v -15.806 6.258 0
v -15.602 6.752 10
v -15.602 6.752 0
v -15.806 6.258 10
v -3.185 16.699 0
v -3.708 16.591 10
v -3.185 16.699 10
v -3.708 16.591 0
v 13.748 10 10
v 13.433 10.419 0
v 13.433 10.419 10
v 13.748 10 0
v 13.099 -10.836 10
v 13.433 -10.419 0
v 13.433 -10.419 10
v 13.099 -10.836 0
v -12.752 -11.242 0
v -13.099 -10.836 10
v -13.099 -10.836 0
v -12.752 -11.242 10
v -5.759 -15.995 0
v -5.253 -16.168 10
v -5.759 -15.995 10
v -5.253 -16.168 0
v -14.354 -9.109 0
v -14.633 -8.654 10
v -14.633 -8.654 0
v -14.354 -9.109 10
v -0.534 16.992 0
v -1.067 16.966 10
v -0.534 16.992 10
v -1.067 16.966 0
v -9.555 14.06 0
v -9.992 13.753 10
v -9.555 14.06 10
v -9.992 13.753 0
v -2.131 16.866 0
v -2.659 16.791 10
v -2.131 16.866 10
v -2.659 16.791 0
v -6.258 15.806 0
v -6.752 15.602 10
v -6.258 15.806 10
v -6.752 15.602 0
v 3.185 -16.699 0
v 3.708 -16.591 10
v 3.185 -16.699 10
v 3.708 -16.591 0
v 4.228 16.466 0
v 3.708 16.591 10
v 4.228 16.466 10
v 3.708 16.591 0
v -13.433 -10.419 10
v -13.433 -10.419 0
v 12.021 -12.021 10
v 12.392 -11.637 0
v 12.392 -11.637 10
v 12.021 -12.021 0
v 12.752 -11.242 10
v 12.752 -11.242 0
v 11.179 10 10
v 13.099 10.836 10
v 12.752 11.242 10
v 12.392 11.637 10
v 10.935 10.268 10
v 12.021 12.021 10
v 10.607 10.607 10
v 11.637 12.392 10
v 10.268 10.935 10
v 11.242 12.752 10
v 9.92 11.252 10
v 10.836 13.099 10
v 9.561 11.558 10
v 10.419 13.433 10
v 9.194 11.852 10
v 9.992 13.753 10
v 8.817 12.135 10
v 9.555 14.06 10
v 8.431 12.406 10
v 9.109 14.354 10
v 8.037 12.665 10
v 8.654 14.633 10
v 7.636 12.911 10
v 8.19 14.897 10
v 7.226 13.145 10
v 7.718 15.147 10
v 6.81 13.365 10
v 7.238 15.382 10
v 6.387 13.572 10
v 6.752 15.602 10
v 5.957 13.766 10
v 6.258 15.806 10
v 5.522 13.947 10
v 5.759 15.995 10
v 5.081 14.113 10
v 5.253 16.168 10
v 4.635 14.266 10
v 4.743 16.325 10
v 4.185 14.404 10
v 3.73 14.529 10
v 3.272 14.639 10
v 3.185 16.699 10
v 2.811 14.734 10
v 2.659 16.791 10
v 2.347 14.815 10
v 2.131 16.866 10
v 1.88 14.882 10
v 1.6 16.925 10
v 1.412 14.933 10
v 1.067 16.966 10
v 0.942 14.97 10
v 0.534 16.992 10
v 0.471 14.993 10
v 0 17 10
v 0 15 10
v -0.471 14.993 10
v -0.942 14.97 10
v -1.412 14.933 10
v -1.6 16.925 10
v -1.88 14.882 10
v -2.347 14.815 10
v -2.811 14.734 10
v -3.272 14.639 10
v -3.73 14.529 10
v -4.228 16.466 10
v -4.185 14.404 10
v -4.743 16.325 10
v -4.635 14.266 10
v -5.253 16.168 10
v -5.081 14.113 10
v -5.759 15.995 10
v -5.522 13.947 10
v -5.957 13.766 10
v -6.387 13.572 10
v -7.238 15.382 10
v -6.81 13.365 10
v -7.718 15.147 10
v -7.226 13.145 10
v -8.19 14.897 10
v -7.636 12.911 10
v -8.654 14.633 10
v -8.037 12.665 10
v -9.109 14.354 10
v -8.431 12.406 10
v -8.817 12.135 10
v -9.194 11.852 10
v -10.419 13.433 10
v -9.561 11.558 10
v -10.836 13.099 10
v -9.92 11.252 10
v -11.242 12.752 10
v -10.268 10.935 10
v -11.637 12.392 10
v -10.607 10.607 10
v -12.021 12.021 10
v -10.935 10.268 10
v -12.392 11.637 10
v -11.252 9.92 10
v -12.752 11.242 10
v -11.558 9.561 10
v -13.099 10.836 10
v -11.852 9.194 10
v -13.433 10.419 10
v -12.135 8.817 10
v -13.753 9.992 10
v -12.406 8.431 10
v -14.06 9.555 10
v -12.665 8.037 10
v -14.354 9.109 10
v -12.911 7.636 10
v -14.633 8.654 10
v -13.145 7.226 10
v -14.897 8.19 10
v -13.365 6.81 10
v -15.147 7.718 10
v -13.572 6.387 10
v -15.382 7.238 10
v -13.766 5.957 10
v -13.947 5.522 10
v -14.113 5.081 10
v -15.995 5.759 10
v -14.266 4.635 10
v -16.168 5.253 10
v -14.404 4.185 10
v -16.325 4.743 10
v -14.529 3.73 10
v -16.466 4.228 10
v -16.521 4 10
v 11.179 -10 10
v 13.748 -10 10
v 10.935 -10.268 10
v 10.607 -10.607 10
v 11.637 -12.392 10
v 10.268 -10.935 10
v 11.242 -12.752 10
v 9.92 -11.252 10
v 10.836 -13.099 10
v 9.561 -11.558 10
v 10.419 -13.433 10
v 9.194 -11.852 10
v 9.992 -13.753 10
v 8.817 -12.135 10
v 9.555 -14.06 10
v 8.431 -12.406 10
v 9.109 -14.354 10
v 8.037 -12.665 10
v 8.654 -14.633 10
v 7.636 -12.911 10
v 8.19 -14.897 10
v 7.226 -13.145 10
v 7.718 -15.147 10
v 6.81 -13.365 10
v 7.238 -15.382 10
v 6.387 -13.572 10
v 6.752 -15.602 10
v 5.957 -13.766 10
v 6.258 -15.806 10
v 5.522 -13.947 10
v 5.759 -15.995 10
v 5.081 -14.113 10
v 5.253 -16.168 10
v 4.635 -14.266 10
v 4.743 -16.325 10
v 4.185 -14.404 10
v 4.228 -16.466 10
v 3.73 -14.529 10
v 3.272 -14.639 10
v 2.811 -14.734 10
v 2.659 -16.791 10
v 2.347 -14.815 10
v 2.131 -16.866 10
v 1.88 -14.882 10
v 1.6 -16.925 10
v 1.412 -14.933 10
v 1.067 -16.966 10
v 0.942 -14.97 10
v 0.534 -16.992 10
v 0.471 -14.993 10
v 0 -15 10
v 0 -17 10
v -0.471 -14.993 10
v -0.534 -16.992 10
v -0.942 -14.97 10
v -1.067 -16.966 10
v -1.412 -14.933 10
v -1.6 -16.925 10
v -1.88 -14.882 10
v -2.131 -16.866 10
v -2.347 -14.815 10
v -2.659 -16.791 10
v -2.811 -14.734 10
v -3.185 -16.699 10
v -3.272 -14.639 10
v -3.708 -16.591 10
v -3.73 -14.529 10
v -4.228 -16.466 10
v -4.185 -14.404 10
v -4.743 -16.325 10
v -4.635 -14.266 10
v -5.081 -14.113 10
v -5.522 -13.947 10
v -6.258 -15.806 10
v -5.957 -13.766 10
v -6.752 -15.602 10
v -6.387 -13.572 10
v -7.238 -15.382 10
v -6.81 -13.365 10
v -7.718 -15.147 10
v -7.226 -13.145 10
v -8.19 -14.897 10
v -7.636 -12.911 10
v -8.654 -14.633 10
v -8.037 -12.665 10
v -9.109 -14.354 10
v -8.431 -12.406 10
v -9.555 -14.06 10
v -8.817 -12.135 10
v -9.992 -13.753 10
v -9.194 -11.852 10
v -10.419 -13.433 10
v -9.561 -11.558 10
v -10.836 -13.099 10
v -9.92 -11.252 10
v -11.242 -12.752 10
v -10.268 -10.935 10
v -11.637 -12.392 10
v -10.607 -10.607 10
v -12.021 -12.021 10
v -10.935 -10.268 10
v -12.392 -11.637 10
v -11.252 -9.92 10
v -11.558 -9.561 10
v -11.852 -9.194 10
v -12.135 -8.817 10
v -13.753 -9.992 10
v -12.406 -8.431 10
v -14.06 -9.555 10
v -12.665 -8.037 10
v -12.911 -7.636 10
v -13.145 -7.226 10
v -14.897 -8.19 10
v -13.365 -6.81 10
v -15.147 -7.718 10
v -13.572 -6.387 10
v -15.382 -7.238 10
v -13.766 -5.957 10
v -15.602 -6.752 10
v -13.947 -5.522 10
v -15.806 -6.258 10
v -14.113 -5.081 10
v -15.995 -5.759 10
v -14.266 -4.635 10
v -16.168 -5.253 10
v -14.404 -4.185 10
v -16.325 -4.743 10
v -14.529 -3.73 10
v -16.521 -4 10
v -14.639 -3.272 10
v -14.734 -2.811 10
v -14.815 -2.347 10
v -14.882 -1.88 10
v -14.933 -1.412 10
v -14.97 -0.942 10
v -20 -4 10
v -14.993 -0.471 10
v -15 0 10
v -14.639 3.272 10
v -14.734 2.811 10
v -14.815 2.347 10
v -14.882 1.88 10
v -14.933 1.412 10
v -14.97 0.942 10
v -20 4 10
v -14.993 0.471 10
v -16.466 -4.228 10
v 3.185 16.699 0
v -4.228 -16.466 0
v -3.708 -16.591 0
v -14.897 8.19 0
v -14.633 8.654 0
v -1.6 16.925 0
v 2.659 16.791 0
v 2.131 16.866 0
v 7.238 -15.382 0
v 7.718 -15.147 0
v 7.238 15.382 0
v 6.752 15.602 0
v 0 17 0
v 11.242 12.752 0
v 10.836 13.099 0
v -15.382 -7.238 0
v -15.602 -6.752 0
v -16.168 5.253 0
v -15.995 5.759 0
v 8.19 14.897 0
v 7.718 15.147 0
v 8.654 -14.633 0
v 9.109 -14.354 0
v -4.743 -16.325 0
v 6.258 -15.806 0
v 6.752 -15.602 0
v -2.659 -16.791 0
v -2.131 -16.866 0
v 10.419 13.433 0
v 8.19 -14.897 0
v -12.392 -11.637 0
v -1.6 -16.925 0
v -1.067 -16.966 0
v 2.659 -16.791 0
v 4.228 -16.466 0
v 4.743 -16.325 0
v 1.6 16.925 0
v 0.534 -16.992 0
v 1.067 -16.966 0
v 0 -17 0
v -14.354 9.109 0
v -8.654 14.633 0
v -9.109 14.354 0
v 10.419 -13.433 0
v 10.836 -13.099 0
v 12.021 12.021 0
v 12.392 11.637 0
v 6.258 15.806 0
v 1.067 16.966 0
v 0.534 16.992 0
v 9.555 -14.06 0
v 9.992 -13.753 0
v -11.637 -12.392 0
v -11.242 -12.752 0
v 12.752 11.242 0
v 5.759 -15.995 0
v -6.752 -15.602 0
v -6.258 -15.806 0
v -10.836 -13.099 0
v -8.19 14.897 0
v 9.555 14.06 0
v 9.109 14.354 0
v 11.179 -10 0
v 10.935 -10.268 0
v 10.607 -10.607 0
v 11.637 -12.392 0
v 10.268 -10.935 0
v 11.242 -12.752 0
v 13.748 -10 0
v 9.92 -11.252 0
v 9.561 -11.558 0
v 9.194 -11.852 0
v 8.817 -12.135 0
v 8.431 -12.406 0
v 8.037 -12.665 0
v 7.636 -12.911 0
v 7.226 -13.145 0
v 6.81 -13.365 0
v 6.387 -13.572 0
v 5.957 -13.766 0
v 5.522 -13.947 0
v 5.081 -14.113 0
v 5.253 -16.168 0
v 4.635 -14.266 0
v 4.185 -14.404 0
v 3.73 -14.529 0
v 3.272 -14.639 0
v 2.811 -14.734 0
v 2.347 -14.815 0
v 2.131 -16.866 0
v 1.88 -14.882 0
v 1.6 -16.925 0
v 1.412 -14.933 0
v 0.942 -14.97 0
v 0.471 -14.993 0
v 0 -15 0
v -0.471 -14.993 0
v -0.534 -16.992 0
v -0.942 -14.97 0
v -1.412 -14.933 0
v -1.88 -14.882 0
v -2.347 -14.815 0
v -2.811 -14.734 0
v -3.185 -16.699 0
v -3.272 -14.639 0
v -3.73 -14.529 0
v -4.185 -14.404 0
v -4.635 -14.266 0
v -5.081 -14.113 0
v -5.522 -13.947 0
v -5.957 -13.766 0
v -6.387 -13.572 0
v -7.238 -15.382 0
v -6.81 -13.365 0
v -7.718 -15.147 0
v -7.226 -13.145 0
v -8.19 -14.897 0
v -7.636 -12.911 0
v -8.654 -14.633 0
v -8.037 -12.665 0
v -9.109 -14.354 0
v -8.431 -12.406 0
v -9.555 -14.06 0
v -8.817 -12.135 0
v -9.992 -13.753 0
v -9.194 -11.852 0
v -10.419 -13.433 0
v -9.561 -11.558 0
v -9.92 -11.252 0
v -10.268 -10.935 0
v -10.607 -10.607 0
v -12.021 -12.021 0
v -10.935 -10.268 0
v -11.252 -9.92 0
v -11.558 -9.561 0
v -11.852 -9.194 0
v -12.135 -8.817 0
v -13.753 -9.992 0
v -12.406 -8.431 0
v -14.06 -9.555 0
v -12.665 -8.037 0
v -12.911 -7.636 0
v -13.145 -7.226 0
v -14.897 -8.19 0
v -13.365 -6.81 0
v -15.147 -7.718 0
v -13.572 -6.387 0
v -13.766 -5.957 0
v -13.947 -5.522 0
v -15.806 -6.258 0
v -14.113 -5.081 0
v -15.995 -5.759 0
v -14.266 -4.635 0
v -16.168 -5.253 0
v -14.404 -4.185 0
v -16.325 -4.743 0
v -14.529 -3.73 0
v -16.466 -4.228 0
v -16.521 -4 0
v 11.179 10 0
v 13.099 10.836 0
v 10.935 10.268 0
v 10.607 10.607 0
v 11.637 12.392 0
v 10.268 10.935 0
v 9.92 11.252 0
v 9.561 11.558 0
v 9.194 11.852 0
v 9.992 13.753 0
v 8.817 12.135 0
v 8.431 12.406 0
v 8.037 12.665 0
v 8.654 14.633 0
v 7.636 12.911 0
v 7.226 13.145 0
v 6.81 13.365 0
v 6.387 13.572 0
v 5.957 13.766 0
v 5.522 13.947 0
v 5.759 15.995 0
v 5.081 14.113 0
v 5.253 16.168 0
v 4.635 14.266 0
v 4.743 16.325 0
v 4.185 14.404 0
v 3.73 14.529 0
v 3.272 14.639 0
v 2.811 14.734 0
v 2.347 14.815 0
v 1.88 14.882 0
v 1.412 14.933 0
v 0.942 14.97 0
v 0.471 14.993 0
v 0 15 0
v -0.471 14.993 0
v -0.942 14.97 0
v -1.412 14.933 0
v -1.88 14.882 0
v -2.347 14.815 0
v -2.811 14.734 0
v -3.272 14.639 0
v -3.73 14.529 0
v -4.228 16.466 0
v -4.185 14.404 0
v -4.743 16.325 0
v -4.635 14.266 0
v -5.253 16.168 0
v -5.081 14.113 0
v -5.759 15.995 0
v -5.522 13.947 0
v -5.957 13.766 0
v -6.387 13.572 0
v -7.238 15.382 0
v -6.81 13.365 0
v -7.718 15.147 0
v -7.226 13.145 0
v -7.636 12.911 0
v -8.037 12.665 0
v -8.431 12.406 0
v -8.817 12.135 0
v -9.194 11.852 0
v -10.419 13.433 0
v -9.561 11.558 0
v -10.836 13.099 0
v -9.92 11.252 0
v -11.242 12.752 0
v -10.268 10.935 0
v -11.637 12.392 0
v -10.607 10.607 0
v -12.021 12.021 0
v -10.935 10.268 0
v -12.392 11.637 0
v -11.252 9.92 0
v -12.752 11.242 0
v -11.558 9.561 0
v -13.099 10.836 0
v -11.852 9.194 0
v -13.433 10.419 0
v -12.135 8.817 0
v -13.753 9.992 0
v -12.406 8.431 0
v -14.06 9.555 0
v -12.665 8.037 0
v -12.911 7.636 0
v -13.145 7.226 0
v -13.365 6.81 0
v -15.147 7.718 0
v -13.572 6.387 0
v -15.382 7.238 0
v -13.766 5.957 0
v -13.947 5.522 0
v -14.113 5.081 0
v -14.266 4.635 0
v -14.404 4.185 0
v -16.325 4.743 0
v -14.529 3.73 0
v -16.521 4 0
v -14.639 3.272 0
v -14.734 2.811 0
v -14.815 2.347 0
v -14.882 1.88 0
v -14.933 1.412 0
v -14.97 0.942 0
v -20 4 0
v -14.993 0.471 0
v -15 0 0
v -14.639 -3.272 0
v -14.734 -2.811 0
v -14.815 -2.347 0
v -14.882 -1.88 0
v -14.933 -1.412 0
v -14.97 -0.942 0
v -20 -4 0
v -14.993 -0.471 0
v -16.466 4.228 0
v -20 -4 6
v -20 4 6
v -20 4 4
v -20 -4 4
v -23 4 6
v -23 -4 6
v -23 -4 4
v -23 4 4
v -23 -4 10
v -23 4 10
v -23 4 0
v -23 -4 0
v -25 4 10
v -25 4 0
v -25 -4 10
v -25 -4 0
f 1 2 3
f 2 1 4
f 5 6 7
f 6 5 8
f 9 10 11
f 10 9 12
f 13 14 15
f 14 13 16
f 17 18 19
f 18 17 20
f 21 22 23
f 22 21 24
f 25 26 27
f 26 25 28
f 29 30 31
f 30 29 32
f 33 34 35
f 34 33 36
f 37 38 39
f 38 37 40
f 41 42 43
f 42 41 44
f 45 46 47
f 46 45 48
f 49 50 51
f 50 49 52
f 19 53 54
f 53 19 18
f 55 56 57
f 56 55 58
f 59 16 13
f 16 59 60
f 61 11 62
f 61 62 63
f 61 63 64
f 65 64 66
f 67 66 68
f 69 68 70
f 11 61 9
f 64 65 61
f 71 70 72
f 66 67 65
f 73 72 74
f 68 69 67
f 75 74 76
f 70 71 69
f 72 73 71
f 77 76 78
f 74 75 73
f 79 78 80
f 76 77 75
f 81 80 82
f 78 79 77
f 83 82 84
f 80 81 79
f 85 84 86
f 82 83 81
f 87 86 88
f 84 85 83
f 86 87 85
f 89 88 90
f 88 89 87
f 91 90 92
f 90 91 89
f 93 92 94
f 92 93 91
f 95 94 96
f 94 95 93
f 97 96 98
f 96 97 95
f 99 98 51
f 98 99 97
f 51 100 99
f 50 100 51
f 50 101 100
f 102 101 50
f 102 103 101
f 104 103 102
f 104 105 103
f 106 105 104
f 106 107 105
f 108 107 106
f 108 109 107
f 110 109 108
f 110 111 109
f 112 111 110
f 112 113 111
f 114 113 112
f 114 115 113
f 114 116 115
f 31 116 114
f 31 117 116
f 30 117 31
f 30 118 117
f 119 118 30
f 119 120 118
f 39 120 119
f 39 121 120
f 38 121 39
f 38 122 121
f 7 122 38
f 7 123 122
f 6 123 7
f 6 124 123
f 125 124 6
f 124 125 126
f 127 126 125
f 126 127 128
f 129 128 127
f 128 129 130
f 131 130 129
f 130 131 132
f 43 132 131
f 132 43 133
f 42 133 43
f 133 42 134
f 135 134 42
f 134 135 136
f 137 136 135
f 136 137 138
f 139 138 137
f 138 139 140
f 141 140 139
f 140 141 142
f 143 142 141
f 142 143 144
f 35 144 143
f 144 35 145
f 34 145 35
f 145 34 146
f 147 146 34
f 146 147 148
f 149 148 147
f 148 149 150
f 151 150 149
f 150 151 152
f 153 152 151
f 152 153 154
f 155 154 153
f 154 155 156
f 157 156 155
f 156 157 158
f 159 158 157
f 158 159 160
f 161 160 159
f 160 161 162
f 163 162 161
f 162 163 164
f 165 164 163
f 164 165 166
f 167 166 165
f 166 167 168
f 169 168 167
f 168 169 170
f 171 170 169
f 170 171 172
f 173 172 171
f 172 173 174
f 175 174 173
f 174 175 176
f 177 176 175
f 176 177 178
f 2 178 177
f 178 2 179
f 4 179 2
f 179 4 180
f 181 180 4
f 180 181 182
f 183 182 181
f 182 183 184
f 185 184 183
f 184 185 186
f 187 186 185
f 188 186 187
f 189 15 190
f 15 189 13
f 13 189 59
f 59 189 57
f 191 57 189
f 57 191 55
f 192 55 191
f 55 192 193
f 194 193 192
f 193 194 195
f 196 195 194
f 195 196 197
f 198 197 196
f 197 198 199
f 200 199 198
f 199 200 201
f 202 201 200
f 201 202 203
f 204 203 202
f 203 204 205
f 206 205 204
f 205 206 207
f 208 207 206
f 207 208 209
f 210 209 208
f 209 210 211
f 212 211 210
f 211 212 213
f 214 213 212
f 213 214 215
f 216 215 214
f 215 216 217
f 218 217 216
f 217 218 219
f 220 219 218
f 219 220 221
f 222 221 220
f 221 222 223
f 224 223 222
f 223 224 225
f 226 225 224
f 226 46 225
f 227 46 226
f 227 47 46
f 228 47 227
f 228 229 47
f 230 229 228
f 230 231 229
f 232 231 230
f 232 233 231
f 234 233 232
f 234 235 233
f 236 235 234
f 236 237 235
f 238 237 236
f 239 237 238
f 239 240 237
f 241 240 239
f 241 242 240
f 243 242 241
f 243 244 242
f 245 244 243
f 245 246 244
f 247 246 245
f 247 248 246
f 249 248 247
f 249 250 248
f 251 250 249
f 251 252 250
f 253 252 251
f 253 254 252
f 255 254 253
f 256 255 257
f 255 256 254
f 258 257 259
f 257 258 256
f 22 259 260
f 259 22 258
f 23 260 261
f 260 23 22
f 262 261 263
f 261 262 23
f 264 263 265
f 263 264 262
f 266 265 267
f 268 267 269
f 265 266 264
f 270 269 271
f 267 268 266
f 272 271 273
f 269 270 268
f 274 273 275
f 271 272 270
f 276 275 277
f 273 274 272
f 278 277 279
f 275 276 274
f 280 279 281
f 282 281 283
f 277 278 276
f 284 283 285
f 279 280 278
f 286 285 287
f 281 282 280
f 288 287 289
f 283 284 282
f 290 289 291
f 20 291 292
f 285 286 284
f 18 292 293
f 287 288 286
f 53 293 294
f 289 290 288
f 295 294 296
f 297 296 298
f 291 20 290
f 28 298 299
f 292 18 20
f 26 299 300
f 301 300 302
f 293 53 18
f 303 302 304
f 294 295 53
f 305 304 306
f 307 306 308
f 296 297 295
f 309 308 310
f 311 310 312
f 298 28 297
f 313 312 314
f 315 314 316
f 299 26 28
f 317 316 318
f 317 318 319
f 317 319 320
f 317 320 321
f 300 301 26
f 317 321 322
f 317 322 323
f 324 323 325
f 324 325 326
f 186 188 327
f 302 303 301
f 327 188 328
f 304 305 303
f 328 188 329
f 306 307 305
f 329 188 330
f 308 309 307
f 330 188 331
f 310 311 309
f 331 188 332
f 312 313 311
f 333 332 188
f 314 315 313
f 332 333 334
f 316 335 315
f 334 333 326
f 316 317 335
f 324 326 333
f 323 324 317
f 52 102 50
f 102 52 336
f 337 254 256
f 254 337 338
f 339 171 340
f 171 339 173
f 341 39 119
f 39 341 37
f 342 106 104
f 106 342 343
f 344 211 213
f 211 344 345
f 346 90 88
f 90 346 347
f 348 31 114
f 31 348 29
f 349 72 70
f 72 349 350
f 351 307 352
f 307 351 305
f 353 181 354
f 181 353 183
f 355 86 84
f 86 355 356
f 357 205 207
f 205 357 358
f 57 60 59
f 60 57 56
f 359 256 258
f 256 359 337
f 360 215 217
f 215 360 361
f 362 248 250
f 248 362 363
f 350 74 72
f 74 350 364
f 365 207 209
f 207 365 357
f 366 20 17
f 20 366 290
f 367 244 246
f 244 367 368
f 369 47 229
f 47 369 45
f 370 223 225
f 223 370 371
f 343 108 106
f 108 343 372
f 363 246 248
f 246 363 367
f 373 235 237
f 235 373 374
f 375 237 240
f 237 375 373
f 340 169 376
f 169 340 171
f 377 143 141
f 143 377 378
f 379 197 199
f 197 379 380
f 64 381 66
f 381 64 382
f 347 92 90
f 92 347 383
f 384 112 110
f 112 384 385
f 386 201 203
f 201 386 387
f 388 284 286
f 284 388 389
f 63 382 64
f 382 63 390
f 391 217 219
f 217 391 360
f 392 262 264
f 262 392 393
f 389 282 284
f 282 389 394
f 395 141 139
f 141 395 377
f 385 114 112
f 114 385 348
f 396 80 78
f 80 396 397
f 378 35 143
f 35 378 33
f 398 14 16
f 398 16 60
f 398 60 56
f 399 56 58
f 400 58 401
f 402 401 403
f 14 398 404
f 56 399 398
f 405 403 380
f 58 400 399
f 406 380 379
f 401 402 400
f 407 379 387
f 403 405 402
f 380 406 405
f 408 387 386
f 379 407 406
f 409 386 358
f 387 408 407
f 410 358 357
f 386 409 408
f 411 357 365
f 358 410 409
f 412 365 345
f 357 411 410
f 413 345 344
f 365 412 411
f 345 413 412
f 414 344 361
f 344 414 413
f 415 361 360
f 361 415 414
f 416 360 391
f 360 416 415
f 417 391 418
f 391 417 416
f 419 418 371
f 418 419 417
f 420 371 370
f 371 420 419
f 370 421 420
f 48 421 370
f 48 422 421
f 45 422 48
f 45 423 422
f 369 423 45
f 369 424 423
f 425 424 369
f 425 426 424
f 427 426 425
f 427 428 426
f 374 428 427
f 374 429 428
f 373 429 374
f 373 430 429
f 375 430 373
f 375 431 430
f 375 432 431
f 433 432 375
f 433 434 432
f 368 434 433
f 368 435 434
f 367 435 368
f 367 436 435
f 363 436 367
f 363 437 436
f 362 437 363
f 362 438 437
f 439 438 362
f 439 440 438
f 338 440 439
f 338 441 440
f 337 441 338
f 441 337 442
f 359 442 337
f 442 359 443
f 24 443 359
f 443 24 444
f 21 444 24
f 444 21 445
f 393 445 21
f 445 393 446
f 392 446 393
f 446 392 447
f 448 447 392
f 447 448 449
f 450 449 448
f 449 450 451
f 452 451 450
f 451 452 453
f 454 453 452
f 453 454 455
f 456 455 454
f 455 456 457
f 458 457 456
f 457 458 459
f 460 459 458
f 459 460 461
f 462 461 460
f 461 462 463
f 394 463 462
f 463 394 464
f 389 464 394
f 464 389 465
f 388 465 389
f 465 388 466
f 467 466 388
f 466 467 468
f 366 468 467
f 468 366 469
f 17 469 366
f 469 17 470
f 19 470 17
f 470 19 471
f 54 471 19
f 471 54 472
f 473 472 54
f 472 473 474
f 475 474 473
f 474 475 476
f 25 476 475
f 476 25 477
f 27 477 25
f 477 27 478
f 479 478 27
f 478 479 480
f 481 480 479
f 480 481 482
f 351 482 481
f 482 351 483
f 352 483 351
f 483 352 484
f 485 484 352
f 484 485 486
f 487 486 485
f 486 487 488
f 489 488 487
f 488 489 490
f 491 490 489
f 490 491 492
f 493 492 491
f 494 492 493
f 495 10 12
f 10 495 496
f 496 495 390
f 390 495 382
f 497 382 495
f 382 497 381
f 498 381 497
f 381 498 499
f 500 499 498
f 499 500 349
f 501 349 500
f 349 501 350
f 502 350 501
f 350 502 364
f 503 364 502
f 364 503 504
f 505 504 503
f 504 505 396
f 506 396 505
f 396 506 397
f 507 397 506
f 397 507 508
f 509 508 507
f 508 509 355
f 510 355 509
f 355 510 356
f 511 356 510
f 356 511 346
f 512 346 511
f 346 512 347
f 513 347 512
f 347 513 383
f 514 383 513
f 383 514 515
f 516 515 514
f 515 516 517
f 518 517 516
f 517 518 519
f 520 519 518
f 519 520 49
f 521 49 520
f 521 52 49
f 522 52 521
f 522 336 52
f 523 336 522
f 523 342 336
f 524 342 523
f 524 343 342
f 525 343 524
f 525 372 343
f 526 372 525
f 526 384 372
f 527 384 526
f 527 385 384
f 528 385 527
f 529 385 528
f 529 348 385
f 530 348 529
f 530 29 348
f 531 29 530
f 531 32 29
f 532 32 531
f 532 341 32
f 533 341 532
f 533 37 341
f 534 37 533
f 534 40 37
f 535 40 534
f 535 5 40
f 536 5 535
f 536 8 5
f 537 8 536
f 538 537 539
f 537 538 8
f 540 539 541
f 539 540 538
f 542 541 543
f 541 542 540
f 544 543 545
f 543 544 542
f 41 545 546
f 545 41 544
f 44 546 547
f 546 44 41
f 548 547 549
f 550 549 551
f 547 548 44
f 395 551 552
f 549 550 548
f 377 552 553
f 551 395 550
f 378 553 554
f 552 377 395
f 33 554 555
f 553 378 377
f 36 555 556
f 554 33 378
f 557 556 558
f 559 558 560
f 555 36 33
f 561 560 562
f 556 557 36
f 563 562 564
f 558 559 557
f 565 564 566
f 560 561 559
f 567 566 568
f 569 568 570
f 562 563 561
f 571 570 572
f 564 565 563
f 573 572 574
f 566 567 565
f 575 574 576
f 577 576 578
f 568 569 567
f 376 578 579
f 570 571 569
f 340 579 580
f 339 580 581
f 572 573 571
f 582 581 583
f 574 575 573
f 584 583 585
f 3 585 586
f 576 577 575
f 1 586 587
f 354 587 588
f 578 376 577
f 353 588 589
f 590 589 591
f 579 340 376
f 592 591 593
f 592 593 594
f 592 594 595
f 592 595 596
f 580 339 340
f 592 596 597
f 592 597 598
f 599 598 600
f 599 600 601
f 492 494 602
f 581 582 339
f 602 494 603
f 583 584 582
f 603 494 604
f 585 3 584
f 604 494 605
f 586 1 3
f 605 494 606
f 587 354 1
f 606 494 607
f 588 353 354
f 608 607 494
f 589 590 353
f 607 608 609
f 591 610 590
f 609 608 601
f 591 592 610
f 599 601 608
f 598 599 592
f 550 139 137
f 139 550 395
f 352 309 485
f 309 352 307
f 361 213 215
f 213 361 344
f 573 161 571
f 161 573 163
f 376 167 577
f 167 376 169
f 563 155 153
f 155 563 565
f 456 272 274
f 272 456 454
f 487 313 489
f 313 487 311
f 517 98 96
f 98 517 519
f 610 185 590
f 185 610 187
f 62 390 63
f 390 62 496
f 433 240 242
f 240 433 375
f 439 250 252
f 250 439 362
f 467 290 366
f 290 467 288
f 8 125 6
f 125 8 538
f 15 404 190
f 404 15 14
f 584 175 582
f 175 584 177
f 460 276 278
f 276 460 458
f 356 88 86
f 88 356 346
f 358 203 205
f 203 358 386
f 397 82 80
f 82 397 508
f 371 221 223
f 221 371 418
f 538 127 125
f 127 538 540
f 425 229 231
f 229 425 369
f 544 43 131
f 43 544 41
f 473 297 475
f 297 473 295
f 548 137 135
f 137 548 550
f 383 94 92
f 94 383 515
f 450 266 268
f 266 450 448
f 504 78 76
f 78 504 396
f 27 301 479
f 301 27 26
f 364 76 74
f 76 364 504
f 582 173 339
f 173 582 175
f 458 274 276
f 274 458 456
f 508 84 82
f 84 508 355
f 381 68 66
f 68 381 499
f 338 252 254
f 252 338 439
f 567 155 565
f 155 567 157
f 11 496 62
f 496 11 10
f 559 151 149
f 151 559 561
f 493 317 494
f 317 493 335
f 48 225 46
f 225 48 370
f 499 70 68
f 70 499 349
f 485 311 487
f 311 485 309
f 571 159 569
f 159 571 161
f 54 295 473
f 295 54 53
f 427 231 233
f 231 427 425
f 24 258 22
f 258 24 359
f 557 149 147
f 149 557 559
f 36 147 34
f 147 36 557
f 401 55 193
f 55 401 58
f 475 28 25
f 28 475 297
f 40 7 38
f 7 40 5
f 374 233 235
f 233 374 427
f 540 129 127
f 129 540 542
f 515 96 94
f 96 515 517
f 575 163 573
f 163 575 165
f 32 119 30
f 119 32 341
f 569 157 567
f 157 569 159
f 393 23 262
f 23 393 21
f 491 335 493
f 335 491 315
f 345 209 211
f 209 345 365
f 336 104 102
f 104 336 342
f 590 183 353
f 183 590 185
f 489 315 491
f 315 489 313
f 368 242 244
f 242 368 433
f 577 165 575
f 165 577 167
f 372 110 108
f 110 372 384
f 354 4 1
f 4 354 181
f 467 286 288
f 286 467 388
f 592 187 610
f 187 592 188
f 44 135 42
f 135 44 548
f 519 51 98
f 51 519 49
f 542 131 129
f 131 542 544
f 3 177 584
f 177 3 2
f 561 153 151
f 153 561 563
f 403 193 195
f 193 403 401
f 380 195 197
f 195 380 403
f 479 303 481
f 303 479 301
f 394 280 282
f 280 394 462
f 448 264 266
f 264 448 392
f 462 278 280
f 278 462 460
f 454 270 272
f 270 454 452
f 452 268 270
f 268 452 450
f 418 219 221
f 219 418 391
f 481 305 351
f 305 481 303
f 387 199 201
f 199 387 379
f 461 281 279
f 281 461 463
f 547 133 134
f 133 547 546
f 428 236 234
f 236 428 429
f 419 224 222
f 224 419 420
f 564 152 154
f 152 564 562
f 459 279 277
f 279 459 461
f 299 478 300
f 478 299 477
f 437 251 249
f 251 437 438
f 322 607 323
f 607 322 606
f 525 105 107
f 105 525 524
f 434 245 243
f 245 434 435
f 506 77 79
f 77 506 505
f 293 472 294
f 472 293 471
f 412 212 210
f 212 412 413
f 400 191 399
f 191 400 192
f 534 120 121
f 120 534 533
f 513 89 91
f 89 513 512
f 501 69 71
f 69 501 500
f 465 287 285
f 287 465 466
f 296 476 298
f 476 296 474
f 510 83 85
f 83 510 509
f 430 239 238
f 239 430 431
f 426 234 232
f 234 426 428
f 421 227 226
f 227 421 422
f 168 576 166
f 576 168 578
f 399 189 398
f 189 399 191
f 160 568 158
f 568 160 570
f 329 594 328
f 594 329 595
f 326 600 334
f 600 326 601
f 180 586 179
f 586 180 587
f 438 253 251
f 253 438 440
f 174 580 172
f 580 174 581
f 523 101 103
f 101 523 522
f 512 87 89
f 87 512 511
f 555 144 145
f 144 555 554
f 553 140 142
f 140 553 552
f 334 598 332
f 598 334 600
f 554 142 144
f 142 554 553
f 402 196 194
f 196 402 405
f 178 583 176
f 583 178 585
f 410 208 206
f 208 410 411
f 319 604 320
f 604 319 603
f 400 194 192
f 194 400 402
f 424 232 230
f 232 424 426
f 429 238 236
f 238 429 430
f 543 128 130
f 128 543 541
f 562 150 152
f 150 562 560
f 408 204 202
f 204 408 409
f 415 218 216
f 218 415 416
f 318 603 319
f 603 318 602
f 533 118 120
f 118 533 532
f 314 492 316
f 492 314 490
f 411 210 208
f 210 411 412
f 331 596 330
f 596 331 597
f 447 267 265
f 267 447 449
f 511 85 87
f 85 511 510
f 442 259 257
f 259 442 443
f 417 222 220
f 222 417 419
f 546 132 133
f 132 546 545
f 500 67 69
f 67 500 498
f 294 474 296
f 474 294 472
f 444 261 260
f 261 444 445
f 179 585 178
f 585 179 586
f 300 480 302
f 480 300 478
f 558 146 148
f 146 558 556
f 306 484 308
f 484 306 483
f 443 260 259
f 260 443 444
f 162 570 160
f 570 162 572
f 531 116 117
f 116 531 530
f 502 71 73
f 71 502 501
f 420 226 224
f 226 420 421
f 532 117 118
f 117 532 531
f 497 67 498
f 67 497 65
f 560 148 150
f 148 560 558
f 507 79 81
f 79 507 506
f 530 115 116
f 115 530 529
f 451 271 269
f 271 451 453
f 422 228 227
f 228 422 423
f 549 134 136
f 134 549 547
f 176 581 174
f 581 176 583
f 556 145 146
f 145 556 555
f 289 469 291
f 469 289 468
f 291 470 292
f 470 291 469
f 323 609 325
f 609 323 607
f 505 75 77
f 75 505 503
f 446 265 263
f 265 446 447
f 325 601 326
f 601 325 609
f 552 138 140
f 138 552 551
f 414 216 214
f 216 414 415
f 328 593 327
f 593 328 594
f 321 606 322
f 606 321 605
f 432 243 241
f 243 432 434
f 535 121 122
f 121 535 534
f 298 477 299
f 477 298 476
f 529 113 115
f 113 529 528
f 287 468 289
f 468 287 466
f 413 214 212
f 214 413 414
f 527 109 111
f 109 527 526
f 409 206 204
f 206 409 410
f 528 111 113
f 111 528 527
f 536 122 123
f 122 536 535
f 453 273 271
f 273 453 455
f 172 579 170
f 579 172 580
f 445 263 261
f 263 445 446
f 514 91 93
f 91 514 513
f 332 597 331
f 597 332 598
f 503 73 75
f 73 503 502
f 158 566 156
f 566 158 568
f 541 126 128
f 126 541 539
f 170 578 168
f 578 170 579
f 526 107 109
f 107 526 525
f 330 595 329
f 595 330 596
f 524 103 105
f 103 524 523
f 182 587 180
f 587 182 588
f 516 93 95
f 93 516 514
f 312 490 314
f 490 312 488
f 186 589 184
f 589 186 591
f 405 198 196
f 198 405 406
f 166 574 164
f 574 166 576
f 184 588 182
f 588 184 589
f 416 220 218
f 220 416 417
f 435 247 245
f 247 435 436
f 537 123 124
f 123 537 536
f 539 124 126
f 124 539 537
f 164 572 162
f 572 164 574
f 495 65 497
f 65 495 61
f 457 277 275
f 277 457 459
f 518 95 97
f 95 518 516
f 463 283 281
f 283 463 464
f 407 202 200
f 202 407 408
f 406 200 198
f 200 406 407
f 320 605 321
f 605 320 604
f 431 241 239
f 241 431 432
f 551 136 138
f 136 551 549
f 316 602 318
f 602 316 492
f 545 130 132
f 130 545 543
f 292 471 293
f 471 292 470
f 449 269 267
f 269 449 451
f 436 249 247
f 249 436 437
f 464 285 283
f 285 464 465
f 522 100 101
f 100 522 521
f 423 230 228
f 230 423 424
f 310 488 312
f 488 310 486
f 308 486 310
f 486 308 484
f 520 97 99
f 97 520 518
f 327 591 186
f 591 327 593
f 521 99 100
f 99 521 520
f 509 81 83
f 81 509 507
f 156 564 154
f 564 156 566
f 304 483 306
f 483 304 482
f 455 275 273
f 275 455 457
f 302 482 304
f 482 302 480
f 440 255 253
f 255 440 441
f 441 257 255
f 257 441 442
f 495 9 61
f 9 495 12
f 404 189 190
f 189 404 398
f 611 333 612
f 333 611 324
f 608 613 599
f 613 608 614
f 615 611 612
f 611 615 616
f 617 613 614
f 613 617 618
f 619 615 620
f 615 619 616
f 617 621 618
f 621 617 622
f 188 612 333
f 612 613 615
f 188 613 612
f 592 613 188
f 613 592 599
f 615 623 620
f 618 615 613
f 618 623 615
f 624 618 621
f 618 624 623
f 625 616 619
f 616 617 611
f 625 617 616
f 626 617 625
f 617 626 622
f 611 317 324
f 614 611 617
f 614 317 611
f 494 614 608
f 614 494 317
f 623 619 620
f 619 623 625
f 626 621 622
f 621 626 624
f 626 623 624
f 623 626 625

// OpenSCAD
/* [Printing parameters] */
//vertex resolution
$fn=200;//[50:1000]

//printing tolerance
tolerance=0.01;

/* [Sizes] */
// inner diameter
in_d=30; //[10:100]
//thin of ring
thin=2; //[1:5]
//heigh of ring
height=10;
//width hole for pluggin
diff=2;
//thicknes of hole for plugging
hole=2;
//width of hole between cube and ring
dist=4;

module ring(in, out, height) {
    difference() {
        cylinder(height,out/2,out/2);
        translate([0,0,-tolerance]) cylinder(height+tolerance+tolerance,in/2,in/2);
    }
}

union() {
    difference() {
        ring(in_d,in_d+thin+thin,height);
        translate([0,-20/2,-tolerance]) cube([20,20,20]);
        }  
    translate([-in_d/2-thin-diff-4,-8/2,height/2-hole/2]) cube([hole+1,8,hole]);
    translate([-in_d/2-thin-diff-hole-4,-8/2,0]) cube([hole,8,height]);
    translate([-in_d/2-thin-4+1,-8/2,0]) cube([dist,8,height]);
    }
